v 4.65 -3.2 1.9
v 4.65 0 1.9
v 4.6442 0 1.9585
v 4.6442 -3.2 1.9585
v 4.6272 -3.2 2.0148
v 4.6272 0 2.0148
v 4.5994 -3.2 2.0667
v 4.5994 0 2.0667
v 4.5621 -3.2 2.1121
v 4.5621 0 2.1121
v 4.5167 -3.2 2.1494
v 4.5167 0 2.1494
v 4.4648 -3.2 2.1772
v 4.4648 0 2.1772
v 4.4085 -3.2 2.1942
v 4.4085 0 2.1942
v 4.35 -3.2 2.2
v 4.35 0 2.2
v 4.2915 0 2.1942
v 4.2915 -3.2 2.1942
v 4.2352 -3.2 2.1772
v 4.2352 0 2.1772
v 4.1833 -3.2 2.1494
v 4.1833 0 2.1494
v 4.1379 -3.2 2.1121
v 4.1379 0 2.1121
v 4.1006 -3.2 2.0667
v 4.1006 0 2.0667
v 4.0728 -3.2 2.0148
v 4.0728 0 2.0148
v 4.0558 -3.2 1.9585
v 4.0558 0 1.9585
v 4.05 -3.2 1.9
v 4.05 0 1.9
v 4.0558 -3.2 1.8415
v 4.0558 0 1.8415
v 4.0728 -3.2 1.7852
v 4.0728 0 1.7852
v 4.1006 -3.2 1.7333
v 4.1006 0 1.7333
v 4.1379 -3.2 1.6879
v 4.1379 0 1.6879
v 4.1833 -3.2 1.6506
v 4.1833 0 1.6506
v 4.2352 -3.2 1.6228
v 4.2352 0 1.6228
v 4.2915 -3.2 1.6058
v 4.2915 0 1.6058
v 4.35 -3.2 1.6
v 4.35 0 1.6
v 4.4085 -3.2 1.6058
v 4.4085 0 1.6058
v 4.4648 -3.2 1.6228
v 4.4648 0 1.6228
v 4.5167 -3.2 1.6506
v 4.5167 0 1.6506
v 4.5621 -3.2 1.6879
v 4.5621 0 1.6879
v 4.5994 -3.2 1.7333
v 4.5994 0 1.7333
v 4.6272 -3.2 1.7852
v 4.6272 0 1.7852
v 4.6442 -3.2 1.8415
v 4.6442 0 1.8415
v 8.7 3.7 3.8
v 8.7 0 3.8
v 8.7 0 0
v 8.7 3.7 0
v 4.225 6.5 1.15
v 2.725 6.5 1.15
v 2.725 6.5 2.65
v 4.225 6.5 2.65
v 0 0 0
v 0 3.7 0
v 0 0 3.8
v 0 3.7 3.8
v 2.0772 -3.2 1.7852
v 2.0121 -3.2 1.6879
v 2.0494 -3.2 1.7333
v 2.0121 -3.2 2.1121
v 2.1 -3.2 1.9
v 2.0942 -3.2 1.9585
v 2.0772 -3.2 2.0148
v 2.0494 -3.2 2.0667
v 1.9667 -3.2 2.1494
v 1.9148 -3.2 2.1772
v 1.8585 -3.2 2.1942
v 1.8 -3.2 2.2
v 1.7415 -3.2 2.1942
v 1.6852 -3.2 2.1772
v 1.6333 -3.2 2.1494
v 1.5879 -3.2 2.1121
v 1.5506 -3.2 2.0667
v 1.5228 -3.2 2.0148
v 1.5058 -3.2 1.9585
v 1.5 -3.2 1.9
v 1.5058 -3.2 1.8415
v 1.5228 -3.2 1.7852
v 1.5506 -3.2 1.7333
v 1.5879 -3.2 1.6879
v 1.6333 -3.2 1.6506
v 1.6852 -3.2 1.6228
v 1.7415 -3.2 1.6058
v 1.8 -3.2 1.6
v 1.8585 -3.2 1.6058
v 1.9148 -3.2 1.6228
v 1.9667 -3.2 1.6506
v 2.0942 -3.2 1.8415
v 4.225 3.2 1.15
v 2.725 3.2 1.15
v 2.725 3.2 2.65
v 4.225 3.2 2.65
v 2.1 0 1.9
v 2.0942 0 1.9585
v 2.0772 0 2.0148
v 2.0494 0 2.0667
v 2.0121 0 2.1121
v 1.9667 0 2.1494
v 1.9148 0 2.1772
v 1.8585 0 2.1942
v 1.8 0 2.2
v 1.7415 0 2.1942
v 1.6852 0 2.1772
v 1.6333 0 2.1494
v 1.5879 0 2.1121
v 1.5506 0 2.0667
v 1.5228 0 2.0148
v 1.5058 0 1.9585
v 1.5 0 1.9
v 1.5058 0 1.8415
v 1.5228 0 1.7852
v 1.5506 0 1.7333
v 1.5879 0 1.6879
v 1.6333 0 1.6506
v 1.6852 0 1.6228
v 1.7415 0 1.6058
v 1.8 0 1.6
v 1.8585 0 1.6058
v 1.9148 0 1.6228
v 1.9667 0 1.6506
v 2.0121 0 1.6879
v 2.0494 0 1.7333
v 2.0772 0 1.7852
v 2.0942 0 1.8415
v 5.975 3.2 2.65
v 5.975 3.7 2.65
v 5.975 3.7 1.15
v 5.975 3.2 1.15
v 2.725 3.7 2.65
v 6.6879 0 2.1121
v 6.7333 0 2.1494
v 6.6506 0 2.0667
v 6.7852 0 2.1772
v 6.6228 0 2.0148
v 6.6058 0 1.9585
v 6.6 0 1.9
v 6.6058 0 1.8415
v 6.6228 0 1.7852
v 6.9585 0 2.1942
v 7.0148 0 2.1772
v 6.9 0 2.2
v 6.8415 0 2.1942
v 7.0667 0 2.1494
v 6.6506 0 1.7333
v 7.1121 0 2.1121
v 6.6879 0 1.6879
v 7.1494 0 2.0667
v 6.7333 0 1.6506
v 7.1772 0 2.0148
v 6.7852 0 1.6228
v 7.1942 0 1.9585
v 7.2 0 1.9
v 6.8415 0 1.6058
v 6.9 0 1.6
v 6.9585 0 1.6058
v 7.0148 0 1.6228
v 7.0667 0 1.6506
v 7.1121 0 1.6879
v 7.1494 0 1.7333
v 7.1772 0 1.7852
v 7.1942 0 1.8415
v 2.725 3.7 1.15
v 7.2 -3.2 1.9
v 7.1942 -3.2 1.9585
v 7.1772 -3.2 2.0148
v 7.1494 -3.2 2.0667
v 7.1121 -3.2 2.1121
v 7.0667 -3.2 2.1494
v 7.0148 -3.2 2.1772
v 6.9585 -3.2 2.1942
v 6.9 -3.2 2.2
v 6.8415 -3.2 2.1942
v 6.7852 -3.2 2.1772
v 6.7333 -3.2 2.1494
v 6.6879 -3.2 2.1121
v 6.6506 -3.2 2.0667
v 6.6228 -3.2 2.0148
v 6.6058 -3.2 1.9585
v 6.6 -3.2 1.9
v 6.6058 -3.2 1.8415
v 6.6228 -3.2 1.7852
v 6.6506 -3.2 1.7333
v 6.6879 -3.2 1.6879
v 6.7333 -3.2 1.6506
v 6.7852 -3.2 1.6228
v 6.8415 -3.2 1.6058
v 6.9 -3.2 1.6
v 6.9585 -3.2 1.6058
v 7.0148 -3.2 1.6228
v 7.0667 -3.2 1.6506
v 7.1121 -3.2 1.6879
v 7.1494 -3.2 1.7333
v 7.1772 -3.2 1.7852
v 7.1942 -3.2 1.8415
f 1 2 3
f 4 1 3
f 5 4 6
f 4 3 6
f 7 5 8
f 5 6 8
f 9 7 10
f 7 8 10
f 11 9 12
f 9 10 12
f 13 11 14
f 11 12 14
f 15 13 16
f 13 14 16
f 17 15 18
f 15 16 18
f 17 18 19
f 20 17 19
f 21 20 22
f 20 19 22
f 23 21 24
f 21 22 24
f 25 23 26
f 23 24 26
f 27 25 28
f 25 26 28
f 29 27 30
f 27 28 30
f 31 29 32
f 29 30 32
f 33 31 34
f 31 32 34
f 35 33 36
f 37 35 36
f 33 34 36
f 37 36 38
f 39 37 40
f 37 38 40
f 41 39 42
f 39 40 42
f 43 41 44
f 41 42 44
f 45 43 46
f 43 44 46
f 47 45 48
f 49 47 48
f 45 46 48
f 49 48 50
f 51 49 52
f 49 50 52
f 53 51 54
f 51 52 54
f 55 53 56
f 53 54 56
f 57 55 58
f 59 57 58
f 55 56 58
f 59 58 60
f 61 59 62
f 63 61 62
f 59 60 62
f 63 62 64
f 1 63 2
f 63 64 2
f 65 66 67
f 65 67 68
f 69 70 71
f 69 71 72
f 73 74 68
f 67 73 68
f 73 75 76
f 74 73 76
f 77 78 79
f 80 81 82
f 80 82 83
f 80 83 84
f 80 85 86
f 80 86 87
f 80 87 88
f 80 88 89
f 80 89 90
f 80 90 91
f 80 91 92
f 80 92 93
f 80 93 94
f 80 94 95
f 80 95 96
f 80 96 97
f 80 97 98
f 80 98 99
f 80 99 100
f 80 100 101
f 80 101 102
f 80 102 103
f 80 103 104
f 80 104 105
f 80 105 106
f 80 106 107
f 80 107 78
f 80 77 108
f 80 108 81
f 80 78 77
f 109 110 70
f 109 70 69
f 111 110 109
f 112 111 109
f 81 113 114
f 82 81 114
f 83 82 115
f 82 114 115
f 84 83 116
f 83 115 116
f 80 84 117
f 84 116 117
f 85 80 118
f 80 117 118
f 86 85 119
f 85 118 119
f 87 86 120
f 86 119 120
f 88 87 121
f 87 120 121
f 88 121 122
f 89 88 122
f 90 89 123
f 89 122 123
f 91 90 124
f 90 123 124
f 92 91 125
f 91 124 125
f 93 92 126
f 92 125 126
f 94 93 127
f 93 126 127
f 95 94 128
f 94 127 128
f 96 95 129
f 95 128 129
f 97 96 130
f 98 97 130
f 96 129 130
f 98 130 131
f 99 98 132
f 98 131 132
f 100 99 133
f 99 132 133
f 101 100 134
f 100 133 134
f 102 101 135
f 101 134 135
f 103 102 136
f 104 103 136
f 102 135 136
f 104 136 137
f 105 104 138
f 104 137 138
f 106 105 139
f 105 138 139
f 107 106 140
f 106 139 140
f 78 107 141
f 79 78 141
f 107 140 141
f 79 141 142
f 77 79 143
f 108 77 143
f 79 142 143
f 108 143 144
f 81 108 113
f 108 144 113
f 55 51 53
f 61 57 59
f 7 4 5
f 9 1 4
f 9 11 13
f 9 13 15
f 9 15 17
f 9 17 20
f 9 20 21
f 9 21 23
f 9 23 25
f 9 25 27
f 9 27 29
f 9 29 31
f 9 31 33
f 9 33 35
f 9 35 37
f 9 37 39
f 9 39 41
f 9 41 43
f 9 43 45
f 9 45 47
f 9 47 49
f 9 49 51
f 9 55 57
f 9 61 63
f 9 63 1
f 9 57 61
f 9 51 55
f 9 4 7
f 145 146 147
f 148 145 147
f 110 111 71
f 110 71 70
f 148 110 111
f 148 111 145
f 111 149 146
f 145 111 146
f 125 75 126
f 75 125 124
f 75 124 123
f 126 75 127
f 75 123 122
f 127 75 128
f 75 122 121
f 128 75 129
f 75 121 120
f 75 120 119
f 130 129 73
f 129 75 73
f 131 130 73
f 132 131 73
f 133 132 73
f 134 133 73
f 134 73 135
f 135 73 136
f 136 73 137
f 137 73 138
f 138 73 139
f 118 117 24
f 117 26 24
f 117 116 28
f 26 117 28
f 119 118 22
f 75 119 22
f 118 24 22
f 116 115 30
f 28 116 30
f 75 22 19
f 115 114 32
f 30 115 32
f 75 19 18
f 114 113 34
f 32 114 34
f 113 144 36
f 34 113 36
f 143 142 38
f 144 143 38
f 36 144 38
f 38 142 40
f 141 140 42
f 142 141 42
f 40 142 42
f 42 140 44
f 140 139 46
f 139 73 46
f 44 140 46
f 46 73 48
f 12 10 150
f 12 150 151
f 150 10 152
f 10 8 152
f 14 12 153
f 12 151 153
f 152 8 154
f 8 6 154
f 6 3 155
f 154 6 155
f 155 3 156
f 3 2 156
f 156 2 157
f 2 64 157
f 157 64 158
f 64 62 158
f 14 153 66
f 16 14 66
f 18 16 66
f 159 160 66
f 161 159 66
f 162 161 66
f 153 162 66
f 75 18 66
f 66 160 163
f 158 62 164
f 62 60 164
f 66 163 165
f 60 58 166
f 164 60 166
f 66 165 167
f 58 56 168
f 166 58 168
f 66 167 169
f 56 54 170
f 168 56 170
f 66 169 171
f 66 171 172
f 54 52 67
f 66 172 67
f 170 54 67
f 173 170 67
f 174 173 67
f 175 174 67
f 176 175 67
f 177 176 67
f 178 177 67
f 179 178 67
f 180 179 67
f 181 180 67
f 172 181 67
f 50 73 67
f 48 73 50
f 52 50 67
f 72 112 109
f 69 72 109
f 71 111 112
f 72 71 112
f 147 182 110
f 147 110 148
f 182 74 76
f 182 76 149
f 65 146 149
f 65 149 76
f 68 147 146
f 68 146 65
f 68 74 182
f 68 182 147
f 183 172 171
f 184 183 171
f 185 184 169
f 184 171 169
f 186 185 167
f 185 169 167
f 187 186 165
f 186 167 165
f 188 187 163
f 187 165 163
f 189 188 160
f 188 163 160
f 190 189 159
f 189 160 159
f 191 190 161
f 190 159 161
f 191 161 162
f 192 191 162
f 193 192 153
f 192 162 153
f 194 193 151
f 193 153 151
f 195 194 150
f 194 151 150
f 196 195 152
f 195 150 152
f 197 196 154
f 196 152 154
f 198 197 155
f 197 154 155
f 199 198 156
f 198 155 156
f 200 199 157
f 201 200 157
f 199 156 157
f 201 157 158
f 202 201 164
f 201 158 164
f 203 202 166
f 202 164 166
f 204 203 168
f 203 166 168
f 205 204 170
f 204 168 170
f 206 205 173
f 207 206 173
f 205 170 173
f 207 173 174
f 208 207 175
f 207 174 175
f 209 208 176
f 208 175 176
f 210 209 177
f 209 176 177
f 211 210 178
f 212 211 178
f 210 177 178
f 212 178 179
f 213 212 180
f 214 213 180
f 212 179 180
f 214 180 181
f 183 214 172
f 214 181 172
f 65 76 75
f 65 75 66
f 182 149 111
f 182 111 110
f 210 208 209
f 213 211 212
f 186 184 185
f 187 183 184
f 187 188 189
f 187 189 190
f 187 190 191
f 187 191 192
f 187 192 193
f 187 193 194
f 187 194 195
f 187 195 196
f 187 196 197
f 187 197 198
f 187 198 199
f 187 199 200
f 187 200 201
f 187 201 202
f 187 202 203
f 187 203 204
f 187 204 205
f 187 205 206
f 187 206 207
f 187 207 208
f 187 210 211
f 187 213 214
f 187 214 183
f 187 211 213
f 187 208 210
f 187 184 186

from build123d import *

# Parameters (mm, degrees)
ESQUISSE1_W             = 8.7
ESQUISSE1_H             = 3.7
BOSS_EXTRU_1_DEPTH      = 3.8
ESQUISSE2_W             = 3.25
ESQUISSE2_H             = 1.5
ENL_V_MAT_EXTRU_1_DEPTH = 0.5
ESQUISSE3_W             = 1.5
ESQUISSE3_H             = 1.5
BOSS_EXTRU_2_DEPTH      = 3.3
ESQUISSE4_R             = 0.3
BOSS_EXTRU_3_DEPTH      = 3.2


with BuildPart() as part:
    # Esquisse1 → Boss.-Extru.1 (new body)
    with BuildSketch(Plane.XY):
        with Locations((4.35, 1.85)):
            Rectangle(ESQUISSE1_W, ESQUISSE1_H)
    extrude(amount=BOSS_EXTRU_1_DEPTH)

    # Esquisse2 → Enlèv. mat.-Extru.1 (cut)
    with BuildSketch(Plane(origin=(0, 3.7, 0), x_dir=(1, 0, 0), z_dir=(0, 1, 0))):
        with Locations((4.35, -1.9)):
            Rectangle(ESQUISSE2_W, ESQUISSE2_H)
    extrude(amount=-ENL_V_MAT_EXTRU_1_DEPTH, mode=Mode.SUBTRACT)

    # Esquisse4 → Boss.-Extru.3 (add)
    with BuildSketch(Plane.XZ):
        with Locations((1.8, 1.9)):
            Circle(ESQUISSE4_R)
        with Locations((4.35, 1.9)):
            Circle(ESQUISSE4_R)
        with Locations((6.9, 1.9)):
            Circle(ESQUISSE4_R)
    extrude(amount=BOSS_EXTRU_3_DEPTH)


with BuildPart() as body_2:
    # Esquisse3 → Boss.-Extru.2 (new body)
    with BuildSketch(Plane(origin=(0, 3.2, 0), x_dir=(1, 0, 0), z_dir=(0, 1, 0))):
        with Locations((3.475, -1.9)):
            Rectangle(ESQUISSE3_W, ESQUISSE3_H)
    extrude(amount=BOSS_EXTRU_2_DEPTH)


solid = Compound([part.part, body_2.part])
